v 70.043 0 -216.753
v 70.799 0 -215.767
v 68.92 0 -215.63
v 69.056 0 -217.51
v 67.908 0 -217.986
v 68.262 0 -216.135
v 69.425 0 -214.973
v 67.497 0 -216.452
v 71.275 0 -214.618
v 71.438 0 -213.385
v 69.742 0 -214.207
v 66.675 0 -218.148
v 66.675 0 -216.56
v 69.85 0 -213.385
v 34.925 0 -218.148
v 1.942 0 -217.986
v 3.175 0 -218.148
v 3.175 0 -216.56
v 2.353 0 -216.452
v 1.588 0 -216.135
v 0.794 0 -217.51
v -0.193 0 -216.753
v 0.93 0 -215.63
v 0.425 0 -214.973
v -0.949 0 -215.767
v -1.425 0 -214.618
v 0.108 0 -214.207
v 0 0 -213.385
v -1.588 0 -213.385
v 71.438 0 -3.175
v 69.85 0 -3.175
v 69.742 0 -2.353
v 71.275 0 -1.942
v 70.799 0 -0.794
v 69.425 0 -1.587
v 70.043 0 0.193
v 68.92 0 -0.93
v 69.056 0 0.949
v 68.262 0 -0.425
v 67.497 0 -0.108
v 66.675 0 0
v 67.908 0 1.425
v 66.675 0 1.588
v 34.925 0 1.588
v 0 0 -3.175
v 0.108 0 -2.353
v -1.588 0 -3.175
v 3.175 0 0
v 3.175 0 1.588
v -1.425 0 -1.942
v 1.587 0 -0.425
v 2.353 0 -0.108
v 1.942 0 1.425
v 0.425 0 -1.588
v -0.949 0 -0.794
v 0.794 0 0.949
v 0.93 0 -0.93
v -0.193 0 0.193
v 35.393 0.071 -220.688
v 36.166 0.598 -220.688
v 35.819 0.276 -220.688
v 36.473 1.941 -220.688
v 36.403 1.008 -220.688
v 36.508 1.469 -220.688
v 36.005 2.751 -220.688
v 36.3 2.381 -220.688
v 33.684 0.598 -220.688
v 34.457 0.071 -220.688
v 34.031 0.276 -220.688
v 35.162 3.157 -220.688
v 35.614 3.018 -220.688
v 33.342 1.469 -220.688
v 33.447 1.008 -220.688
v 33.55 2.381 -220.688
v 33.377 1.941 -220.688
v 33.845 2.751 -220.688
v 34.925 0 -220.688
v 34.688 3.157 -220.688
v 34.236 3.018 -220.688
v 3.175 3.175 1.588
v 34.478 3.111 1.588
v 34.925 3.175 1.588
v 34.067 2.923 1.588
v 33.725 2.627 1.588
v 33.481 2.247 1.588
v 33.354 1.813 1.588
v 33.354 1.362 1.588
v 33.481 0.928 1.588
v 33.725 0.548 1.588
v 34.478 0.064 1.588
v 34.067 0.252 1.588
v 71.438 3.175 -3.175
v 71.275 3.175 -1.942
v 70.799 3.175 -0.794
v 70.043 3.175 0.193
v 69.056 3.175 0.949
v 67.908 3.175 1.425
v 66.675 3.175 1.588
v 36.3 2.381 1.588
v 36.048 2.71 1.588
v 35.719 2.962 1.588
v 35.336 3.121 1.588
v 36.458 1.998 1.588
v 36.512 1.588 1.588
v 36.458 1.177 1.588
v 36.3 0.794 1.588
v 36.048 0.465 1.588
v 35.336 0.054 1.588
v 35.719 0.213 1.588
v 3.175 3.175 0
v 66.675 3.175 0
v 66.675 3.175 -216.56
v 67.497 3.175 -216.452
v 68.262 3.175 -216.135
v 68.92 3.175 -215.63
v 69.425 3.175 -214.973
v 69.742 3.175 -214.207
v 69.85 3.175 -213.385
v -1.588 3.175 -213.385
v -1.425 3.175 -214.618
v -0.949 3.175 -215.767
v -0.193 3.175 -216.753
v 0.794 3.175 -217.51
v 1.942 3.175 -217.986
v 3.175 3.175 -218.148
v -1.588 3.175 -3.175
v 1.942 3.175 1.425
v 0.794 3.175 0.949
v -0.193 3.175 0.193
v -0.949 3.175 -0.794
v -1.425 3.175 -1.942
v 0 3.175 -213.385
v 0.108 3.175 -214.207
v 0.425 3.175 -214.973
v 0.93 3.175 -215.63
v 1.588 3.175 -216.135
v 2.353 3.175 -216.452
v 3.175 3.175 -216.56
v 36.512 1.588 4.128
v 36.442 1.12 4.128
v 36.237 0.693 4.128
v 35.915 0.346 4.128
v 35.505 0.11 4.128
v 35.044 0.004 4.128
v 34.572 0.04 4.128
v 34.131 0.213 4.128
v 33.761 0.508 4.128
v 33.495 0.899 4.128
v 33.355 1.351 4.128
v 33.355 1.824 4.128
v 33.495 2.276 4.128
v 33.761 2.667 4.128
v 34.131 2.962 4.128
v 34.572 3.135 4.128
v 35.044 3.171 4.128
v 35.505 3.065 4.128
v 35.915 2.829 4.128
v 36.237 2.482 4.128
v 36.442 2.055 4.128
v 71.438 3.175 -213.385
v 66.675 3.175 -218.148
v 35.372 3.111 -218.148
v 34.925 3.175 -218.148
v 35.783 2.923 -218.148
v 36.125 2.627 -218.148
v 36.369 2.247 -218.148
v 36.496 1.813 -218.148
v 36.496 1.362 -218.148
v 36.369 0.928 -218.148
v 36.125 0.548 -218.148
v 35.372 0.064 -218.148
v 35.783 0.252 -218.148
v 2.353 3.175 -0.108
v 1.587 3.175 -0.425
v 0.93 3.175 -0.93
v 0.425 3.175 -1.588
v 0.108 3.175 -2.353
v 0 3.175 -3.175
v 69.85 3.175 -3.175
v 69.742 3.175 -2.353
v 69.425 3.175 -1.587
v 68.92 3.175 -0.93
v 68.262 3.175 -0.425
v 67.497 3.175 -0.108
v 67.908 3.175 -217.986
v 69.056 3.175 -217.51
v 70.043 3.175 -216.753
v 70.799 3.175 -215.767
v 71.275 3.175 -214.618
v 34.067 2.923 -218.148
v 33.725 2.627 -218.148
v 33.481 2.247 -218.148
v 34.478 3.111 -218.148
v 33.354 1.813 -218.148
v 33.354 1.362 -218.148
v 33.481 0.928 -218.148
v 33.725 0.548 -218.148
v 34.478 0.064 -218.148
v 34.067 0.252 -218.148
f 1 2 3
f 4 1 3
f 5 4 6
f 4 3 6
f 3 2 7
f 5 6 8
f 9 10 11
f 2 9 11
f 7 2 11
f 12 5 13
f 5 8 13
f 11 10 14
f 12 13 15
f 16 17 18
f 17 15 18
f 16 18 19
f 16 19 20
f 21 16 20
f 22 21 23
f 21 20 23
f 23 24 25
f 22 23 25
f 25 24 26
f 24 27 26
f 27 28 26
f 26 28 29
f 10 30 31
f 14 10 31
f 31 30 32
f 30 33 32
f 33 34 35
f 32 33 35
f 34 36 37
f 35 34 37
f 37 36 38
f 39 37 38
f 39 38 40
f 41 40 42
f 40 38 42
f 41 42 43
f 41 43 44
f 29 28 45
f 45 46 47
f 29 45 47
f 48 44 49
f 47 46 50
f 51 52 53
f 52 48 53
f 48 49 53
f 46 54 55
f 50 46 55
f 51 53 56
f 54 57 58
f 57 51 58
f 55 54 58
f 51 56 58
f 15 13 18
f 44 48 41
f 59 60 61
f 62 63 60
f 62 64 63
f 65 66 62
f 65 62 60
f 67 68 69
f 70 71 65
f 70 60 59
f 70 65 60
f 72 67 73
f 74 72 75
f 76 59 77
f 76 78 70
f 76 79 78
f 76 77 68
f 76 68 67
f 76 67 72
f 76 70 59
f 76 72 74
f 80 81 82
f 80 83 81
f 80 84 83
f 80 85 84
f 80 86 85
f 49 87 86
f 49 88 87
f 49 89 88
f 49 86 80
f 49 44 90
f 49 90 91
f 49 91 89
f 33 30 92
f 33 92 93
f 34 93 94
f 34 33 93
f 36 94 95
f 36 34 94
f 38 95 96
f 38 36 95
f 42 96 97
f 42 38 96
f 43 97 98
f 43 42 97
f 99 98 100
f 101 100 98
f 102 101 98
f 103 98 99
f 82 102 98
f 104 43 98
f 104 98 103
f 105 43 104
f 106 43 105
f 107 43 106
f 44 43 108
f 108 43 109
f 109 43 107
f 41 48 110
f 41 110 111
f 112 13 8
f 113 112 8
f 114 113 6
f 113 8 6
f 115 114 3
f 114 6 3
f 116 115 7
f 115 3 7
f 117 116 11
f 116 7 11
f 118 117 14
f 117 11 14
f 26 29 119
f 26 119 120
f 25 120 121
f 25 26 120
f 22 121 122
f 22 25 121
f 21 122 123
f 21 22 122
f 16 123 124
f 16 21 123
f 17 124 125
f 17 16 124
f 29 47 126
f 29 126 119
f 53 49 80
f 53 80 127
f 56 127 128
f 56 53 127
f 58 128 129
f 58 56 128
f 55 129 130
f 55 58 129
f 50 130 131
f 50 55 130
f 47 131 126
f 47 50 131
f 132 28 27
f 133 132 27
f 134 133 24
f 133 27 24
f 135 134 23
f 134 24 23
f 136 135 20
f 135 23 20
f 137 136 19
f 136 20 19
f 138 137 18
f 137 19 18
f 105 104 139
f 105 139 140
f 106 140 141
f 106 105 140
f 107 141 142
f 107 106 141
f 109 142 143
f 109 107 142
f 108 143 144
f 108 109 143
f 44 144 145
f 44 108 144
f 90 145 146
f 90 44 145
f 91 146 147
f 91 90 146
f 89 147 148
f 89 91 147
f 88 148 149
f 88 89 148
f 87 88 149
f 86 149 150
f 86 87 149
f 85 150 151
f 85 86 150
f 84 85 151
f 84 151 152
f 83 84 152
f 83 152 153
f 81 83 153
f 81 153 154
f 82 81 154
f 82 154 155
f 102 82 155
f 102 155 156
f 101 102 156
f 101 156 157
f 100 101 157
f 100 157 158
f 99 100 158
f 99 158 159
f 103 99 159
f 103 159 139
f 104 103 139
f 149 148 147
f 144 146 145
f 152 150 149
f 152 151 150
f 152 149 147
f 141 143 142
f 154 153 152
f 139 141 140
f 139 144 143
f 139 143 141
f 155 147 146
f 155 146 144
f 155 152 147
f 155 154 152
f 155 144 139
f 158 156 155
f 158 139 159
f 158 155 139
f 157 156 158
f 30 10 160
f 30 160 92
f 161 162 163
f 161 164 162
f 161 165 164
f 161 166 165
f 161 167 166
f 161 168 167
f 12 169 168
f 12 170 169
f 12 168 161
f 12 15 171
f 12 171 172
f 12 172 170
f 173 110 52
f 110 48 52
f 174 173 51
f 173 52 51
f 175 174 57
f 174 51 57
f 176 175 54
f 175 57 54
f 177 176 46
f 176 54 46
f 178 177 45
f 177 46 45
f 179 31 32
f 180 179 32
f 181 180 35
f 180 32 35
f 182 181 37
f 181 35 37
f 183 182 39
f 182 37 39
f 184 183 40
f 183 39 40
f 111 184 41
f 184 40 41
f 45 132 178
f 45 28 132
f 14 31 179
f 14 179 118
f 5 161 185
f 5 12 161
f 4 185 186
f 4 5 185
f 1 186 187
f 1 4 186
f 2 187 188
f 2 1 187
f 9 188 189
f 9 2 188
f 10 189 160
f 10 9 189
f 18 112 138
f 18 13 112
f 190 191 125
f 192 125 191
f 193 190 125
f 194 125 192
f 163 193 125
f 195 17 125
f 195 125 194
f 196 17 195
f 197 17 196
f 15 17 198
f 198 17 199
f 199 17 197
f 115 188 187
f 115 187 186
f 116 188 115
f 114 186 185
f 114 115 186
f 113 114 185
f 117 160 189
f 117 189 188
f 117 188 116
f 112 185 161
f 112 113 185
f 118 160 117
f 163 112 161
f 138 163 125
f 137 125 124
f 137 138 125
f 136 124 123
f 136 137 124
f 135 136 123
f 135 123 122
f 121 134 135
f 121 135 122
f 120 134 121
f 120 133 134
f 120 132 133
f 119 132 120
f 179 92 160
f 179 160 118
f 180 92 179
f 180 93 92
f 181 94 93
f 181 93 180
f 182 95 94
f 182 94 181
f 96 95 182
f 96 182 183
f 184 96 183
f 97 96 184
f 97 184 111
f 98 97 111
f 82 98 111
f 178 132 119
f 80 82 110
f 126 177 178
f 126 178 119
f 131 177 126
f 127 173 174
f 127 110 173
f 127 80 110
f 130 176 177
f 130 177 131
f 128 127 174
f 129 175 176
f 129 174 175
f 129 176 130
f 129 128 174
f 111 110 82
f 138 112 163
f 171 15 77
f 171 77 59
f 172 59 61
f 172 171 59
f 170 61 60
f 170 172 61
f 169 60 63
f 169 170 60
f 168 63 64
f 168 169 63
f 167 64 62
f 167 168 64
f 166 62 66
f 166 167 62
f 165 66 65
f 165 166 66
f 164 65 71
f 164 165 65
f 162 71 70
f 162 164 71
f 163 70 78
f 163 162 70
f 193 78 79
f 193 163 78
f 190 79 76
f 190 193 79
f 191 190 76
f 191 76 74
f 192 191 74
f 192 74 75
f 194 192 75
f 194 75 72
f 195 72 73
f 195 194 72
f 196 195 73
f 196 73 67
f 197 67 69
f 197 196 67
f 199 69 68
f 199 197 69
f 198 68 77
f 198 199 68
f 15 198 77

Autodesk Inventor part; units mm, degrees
ref_plane "YZ Plane" through (0, 0, 0) normal (1, 0, 0) x (0, 1, 0)
ref_plane "XZ Plane" through (0, 0, 0) normal (0, 1, 0) x (-1, 0, 0)
ref_plane "XY Plane" through (0, 0, 0) normal (0, 0, 1) x (1, 0, 0)
sketch "Sketch1" plane through (0, 0, 0) normal (0, 1, 0) x (-1, 0, 0)
  line L0 (-3.175, 0) -> (-66.675, 0)
  line L1 (-69.85, -3.175) -> (-69.85, -213.3854)
  line L2 (-66.675, -216.5604) -> (-3.175, -216.5604)
  line L3 (0, -213.3854) -> (0, -3.175)
  arc A0 (0, -3.175) -> (-3.175, 0) centre (-3.175, -3.175) ccw
  arc A1 (-66.675, 0) -> (-69.85, -3.175) centre (-66.675, -3.175) ccw
  arc A2 (-69.85, -213.3854) -> (-66.675, -216.5604) centre (-66.675, -213.3854) ccw
  arc A3 (-3.175, -216.5604) -> (0, -213.3854) centre (-3.175, -213.3854) ccw
  line L4 (1.5875, -3.175) -> (1.5875, -213.3854)
  arc A4 (-3.175, -218.1479) -> (1.5875, -213.3854) centre (-3.175, -213.3854) ccw
  line L5 (-3.175, -218.1479) -> (-66.675, -218.1479)
  arc A5 (-71.4375, -213.3854) -> (-66.675, -218.1479) centre (-66.675, -213.3854) ccw
  line L6 (-71.4375, -213.3854) -> (-71.4375, -3.175)
  arc A6 (-66.675, 1.5875) -> (-71.4375, -3.175) centre (-66.675, -3.175) ccw
  line L7 (-66.675, 1.5875) -> (-3.175, 1.5875)
  arc A7 (1.5875, -3.175) -> (-3.175, 1.5875) centre (-3.175, -3.175) ccw
  point P0 (0, 0)
  point P1 (-69.85, -216.5604)
  point P2 (-69.85, 0)
  point P3 (0, -216.5604)
  dimension "d0" = 69.85
  dimension "d1" = 216.5604
  dimension "d2" = 3.175
extrude "Extrusion2" add sketch "Sketch1" along normal blind 3.175
sketch "Sketch4" plane through (3.175, 0, 1.5875) normal (0, 0, 1) x (1, 0, 0)
  circle A0 centre (31.75, 1.5875) radius 1.5875
  line L0 (0, 0) -> (0, 3.175) projected
  line L1 (0, 0) -> (63.5, 0) projected
  point P0 (-3.175, 0)
  dimension "d11" = 3.175
  dimension "d12" = 31.75
  dimension "d13" = 1.5875
extrude "Extrusion3" add sketch "Sketch4" along normal blind 2.54
sketch "Sketch5" plane through (66.675, 0, -218.1479) normal (0, 0, -1) x (-1, 0, 0)
  arc A0 (31.75, 0) -> (31.75, 3.175) centre (31.75, 1.5875) ccw projected
  circle A1 centre (31.75, 1.5875) radius 1.5875
  point P0 (66.675, 0)
  point P1 (31.75, 3.175)
  point P2 (31.75, 0)
extrude "Extrusion4" add sketch "Sketch5" along normal blind 2.54
properties part number "30t_8.5_in"
